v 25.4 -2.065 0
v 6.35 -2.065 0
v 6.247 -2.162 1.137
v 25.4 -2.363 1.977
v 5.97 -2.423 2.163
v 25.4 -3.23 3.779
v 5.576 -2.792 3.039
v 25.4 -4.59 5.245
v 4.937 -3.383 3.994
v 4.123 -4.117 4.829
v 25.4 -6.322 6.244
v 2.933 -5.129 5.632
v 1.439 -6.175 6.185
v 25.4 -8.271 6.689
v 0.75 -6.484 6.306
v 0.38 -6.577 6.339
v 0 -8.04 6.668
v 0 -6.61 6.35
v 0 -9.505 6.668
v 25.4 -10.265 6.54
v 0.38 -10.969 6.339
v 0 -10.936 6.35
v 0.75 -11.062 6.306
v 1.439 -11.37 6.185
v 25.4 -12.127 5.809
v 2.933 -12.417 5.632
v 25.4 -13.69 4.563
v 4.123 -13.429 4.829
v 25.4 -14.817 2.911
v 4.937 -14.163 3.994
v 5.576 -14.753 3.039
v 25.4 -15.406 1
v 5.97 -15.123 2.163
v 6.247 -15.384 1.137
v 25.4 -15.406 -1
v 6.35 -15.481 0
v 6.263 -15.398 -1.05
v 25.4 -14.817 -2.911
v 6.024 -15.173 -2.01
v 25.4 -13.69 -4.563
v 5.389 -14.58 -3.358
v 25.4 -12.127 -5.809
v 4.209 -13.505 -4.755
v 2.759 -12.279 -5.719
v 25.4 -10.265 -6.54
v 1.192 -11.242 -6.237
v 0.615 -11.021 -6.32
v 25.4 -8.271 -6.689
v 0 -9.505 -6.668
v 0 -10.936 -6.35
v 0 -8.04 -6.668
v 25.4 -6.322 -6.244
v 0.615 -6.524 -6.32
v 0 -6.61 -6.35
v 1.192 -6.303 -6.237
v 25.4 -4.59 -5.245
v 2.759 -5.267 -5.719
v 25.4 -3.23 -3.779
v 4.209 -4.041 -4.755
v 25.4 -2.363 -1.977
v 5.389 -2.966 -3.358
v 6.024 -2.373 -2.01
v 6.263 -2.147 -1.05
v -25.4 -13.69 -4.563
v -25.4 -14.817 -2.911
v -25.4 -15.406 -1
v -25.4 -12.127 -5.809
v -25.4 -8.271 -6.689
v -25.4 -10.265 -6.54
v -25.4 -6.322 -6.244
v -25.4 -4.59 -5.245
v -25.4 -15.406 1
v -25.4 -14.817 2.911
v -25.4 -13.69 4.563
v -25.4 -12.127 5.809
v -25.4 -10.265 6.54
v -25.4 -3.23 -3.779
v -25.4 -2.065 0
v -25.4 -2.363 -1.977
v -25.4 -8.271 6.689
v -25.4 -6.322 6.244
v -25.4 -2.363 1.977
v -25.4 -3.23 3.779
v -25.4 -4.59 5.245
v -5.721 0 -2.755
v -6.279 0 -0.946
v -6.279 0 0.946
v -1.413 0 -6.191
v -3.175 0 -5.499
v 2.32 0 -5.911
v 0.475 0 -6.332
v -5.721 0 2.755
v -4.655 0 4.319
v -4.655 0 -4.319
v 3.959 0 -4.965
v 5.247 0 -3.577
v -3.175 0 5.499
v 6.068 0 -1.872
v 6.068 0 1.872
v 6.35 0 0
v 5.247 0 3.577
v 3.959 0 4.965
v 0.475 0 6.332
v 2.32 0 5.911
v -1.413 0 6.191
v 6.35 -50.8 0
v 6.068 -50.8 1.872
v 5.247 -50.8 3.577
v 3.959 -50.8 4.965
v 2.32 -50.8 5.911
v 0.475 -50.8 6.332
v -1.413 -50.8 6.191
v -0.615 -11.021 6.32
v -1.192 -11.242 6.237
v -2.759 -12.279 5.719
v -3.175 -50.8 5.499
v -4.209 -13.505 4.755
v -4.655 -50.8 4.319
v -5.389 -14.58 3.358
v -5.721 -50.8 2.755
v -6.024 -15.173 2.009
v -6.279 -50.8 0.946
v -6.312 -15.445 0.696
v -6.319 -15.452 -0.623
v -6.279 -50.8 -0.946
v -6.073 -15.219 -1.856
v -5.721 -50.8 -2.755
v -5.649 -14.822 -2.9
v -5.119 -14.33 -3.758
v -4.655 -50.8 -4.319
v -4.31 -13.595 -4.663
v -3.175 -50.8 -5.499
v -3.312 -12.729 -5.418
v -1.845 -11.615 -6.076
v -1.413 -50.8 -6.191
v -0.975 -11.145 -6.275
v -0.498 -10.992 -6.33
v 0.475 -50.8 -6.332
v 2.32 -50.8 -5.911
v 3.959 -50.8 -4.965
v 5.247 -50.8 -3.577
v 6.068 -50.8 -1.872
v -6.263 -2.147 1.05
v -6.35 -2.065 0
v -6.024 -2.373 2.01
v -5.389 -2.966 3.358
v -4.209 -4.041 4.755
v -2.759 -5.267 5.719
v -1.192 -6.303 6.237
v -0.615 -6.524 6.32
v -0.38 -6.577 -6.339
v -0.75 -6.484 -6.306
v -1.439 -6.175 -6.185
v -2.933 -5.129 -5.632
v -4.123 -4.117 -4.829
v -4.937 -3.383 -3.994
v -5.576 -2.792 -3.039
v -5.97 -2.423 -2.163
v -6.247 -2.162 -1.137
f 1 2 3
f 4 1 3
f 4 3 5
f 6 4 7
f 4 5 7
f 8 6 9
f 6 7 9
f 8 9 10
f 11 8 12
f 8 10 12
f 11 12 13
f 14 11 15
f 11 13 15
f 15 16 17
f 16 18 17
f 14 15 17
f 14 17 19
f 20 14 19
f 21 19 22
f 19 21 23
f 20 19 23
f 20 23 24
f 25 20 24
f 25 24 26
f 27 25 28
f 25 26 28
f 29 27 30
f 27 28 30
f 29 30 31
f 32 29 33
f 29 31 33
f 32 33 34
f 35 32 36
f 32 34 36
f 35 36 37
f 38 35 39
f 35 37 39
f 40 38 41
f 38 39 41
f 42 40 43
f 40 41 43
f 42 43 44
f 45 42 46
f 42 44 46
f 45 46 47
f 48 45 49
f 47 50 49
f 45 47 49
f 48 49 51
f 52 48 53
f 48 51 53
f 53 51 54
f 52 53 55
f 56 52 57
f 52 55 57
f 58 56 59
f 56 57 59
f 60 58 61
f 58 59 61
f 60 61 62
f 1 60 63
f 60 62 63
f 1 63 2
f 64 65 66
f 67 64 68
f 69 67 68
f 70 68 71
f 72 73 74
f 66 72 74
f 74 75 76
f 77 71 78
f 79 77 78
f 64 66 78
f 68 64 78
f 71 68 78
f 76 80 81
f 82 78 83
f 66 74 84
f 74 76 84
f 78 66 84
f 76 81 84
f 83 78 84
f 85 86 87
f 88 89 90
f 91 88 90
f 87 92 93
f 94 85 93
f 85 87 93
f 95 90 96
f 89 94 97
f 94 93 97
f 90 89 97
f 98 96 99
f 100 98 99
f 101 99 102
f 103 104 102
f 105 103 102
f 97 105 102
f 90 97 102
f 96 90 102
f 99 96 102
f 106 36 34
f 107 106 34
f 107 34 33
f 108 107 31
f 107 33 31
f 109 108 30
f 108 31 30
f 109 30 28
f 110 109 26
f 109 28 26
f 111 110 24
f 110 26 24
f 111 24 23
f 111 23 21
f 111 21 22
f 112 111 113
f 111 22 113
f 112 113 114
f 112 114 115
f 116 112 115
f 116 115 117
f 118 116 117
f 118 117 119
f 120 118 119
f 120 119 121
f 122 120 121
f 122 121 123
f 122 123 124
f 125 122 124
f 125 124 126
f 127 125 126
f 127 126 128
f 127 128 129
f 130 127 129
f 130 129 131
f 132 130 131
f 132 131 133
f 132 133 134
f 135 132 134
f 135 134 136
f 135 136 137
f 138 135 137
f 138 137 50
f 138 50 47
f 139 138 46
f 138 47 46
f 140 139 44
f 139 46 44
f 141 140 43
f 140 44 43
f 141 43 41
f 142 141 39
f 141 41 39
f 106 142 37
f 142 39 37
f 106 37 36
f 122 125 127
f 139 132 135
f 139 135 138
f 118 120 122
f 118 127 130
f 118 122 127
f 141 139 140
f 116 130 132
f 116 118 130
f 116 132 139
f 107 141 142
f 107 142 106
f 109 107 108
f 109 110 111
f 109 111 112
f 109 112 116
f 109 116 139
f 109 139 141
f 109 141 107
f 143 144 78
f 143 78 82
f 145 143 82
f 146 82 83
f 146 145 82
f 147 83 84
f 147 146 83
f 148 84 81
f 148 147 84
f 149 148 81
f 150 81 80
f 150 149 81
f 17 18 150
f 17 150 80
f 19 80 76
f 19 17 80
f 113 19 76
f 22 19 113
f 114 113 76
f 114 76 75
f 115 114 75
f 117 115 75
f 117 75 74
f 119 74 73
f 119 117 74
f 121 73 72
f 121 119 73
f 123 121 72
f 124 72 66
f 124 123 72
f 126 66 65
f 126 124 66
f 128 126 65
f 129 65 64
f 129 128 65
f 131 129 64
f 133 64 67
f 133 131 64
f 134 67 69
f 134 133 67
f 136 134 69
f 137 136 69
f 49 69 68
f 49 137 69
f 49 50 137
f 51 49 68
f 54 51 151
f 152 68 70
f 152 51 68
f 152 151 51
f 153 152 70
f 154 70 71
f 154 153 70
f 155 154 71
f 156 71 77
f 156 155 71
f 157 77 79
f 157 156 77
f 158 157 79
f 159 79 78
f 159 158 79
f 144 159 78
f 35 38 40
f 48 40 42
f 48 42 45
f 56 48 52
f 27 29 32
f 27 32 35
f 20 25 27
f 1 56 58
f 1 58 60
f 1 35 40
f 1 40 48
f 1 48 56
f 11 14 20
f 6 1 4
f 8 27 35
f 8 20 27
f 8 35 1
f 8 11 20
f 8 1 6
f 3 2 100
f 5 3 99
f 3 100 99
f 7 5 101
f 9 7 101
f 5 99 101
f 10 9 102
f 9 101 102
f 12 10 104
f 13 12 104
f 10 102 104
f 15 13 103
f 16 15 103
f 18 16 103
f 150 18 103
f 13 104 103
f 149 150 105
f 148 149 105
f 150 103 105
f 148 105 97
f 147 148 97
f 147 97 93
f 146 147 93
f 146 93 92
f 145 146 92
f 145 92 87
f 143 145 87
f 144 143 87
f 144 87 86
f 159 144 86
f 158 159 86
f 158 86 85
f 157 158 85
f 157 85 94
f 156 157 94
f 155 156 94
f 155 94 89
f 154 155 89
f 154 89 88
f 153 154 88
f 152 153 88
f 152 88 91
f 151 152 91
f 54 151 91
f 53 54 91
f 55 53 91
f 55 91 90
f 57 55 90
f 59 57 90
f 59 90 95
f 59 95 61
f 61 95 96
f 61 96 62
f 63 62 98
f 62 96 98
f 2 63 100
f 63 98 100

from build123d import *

# Parameters (mm, degrees)
F0_R          = 6.35
F1_DEPTH      = 50.8
F2_R          = 6.708201
F3_DEPTH      = 25.4
F3_DEPTH_BACK = 25.4


with BuildPart() as f1:
    # F0 (on Front) → F1 (new body)
    with BuildSketch(Plane.XZ):
        Circle(F0_R)
    extrude(amount=F1_DEPTH)

    # F2 (on Right) → F3 (join, two sides)
    with BuildSketch(Plane.YZ) as f3_sk:
        with Locations((-8.772769, 0)):
            Circle(F2_R)
    extrude(amount=F3_DEPTH)
    extrude(f3_sk.sketch, amount=-F3_DEPTH_BACK)


solid = f1.part
